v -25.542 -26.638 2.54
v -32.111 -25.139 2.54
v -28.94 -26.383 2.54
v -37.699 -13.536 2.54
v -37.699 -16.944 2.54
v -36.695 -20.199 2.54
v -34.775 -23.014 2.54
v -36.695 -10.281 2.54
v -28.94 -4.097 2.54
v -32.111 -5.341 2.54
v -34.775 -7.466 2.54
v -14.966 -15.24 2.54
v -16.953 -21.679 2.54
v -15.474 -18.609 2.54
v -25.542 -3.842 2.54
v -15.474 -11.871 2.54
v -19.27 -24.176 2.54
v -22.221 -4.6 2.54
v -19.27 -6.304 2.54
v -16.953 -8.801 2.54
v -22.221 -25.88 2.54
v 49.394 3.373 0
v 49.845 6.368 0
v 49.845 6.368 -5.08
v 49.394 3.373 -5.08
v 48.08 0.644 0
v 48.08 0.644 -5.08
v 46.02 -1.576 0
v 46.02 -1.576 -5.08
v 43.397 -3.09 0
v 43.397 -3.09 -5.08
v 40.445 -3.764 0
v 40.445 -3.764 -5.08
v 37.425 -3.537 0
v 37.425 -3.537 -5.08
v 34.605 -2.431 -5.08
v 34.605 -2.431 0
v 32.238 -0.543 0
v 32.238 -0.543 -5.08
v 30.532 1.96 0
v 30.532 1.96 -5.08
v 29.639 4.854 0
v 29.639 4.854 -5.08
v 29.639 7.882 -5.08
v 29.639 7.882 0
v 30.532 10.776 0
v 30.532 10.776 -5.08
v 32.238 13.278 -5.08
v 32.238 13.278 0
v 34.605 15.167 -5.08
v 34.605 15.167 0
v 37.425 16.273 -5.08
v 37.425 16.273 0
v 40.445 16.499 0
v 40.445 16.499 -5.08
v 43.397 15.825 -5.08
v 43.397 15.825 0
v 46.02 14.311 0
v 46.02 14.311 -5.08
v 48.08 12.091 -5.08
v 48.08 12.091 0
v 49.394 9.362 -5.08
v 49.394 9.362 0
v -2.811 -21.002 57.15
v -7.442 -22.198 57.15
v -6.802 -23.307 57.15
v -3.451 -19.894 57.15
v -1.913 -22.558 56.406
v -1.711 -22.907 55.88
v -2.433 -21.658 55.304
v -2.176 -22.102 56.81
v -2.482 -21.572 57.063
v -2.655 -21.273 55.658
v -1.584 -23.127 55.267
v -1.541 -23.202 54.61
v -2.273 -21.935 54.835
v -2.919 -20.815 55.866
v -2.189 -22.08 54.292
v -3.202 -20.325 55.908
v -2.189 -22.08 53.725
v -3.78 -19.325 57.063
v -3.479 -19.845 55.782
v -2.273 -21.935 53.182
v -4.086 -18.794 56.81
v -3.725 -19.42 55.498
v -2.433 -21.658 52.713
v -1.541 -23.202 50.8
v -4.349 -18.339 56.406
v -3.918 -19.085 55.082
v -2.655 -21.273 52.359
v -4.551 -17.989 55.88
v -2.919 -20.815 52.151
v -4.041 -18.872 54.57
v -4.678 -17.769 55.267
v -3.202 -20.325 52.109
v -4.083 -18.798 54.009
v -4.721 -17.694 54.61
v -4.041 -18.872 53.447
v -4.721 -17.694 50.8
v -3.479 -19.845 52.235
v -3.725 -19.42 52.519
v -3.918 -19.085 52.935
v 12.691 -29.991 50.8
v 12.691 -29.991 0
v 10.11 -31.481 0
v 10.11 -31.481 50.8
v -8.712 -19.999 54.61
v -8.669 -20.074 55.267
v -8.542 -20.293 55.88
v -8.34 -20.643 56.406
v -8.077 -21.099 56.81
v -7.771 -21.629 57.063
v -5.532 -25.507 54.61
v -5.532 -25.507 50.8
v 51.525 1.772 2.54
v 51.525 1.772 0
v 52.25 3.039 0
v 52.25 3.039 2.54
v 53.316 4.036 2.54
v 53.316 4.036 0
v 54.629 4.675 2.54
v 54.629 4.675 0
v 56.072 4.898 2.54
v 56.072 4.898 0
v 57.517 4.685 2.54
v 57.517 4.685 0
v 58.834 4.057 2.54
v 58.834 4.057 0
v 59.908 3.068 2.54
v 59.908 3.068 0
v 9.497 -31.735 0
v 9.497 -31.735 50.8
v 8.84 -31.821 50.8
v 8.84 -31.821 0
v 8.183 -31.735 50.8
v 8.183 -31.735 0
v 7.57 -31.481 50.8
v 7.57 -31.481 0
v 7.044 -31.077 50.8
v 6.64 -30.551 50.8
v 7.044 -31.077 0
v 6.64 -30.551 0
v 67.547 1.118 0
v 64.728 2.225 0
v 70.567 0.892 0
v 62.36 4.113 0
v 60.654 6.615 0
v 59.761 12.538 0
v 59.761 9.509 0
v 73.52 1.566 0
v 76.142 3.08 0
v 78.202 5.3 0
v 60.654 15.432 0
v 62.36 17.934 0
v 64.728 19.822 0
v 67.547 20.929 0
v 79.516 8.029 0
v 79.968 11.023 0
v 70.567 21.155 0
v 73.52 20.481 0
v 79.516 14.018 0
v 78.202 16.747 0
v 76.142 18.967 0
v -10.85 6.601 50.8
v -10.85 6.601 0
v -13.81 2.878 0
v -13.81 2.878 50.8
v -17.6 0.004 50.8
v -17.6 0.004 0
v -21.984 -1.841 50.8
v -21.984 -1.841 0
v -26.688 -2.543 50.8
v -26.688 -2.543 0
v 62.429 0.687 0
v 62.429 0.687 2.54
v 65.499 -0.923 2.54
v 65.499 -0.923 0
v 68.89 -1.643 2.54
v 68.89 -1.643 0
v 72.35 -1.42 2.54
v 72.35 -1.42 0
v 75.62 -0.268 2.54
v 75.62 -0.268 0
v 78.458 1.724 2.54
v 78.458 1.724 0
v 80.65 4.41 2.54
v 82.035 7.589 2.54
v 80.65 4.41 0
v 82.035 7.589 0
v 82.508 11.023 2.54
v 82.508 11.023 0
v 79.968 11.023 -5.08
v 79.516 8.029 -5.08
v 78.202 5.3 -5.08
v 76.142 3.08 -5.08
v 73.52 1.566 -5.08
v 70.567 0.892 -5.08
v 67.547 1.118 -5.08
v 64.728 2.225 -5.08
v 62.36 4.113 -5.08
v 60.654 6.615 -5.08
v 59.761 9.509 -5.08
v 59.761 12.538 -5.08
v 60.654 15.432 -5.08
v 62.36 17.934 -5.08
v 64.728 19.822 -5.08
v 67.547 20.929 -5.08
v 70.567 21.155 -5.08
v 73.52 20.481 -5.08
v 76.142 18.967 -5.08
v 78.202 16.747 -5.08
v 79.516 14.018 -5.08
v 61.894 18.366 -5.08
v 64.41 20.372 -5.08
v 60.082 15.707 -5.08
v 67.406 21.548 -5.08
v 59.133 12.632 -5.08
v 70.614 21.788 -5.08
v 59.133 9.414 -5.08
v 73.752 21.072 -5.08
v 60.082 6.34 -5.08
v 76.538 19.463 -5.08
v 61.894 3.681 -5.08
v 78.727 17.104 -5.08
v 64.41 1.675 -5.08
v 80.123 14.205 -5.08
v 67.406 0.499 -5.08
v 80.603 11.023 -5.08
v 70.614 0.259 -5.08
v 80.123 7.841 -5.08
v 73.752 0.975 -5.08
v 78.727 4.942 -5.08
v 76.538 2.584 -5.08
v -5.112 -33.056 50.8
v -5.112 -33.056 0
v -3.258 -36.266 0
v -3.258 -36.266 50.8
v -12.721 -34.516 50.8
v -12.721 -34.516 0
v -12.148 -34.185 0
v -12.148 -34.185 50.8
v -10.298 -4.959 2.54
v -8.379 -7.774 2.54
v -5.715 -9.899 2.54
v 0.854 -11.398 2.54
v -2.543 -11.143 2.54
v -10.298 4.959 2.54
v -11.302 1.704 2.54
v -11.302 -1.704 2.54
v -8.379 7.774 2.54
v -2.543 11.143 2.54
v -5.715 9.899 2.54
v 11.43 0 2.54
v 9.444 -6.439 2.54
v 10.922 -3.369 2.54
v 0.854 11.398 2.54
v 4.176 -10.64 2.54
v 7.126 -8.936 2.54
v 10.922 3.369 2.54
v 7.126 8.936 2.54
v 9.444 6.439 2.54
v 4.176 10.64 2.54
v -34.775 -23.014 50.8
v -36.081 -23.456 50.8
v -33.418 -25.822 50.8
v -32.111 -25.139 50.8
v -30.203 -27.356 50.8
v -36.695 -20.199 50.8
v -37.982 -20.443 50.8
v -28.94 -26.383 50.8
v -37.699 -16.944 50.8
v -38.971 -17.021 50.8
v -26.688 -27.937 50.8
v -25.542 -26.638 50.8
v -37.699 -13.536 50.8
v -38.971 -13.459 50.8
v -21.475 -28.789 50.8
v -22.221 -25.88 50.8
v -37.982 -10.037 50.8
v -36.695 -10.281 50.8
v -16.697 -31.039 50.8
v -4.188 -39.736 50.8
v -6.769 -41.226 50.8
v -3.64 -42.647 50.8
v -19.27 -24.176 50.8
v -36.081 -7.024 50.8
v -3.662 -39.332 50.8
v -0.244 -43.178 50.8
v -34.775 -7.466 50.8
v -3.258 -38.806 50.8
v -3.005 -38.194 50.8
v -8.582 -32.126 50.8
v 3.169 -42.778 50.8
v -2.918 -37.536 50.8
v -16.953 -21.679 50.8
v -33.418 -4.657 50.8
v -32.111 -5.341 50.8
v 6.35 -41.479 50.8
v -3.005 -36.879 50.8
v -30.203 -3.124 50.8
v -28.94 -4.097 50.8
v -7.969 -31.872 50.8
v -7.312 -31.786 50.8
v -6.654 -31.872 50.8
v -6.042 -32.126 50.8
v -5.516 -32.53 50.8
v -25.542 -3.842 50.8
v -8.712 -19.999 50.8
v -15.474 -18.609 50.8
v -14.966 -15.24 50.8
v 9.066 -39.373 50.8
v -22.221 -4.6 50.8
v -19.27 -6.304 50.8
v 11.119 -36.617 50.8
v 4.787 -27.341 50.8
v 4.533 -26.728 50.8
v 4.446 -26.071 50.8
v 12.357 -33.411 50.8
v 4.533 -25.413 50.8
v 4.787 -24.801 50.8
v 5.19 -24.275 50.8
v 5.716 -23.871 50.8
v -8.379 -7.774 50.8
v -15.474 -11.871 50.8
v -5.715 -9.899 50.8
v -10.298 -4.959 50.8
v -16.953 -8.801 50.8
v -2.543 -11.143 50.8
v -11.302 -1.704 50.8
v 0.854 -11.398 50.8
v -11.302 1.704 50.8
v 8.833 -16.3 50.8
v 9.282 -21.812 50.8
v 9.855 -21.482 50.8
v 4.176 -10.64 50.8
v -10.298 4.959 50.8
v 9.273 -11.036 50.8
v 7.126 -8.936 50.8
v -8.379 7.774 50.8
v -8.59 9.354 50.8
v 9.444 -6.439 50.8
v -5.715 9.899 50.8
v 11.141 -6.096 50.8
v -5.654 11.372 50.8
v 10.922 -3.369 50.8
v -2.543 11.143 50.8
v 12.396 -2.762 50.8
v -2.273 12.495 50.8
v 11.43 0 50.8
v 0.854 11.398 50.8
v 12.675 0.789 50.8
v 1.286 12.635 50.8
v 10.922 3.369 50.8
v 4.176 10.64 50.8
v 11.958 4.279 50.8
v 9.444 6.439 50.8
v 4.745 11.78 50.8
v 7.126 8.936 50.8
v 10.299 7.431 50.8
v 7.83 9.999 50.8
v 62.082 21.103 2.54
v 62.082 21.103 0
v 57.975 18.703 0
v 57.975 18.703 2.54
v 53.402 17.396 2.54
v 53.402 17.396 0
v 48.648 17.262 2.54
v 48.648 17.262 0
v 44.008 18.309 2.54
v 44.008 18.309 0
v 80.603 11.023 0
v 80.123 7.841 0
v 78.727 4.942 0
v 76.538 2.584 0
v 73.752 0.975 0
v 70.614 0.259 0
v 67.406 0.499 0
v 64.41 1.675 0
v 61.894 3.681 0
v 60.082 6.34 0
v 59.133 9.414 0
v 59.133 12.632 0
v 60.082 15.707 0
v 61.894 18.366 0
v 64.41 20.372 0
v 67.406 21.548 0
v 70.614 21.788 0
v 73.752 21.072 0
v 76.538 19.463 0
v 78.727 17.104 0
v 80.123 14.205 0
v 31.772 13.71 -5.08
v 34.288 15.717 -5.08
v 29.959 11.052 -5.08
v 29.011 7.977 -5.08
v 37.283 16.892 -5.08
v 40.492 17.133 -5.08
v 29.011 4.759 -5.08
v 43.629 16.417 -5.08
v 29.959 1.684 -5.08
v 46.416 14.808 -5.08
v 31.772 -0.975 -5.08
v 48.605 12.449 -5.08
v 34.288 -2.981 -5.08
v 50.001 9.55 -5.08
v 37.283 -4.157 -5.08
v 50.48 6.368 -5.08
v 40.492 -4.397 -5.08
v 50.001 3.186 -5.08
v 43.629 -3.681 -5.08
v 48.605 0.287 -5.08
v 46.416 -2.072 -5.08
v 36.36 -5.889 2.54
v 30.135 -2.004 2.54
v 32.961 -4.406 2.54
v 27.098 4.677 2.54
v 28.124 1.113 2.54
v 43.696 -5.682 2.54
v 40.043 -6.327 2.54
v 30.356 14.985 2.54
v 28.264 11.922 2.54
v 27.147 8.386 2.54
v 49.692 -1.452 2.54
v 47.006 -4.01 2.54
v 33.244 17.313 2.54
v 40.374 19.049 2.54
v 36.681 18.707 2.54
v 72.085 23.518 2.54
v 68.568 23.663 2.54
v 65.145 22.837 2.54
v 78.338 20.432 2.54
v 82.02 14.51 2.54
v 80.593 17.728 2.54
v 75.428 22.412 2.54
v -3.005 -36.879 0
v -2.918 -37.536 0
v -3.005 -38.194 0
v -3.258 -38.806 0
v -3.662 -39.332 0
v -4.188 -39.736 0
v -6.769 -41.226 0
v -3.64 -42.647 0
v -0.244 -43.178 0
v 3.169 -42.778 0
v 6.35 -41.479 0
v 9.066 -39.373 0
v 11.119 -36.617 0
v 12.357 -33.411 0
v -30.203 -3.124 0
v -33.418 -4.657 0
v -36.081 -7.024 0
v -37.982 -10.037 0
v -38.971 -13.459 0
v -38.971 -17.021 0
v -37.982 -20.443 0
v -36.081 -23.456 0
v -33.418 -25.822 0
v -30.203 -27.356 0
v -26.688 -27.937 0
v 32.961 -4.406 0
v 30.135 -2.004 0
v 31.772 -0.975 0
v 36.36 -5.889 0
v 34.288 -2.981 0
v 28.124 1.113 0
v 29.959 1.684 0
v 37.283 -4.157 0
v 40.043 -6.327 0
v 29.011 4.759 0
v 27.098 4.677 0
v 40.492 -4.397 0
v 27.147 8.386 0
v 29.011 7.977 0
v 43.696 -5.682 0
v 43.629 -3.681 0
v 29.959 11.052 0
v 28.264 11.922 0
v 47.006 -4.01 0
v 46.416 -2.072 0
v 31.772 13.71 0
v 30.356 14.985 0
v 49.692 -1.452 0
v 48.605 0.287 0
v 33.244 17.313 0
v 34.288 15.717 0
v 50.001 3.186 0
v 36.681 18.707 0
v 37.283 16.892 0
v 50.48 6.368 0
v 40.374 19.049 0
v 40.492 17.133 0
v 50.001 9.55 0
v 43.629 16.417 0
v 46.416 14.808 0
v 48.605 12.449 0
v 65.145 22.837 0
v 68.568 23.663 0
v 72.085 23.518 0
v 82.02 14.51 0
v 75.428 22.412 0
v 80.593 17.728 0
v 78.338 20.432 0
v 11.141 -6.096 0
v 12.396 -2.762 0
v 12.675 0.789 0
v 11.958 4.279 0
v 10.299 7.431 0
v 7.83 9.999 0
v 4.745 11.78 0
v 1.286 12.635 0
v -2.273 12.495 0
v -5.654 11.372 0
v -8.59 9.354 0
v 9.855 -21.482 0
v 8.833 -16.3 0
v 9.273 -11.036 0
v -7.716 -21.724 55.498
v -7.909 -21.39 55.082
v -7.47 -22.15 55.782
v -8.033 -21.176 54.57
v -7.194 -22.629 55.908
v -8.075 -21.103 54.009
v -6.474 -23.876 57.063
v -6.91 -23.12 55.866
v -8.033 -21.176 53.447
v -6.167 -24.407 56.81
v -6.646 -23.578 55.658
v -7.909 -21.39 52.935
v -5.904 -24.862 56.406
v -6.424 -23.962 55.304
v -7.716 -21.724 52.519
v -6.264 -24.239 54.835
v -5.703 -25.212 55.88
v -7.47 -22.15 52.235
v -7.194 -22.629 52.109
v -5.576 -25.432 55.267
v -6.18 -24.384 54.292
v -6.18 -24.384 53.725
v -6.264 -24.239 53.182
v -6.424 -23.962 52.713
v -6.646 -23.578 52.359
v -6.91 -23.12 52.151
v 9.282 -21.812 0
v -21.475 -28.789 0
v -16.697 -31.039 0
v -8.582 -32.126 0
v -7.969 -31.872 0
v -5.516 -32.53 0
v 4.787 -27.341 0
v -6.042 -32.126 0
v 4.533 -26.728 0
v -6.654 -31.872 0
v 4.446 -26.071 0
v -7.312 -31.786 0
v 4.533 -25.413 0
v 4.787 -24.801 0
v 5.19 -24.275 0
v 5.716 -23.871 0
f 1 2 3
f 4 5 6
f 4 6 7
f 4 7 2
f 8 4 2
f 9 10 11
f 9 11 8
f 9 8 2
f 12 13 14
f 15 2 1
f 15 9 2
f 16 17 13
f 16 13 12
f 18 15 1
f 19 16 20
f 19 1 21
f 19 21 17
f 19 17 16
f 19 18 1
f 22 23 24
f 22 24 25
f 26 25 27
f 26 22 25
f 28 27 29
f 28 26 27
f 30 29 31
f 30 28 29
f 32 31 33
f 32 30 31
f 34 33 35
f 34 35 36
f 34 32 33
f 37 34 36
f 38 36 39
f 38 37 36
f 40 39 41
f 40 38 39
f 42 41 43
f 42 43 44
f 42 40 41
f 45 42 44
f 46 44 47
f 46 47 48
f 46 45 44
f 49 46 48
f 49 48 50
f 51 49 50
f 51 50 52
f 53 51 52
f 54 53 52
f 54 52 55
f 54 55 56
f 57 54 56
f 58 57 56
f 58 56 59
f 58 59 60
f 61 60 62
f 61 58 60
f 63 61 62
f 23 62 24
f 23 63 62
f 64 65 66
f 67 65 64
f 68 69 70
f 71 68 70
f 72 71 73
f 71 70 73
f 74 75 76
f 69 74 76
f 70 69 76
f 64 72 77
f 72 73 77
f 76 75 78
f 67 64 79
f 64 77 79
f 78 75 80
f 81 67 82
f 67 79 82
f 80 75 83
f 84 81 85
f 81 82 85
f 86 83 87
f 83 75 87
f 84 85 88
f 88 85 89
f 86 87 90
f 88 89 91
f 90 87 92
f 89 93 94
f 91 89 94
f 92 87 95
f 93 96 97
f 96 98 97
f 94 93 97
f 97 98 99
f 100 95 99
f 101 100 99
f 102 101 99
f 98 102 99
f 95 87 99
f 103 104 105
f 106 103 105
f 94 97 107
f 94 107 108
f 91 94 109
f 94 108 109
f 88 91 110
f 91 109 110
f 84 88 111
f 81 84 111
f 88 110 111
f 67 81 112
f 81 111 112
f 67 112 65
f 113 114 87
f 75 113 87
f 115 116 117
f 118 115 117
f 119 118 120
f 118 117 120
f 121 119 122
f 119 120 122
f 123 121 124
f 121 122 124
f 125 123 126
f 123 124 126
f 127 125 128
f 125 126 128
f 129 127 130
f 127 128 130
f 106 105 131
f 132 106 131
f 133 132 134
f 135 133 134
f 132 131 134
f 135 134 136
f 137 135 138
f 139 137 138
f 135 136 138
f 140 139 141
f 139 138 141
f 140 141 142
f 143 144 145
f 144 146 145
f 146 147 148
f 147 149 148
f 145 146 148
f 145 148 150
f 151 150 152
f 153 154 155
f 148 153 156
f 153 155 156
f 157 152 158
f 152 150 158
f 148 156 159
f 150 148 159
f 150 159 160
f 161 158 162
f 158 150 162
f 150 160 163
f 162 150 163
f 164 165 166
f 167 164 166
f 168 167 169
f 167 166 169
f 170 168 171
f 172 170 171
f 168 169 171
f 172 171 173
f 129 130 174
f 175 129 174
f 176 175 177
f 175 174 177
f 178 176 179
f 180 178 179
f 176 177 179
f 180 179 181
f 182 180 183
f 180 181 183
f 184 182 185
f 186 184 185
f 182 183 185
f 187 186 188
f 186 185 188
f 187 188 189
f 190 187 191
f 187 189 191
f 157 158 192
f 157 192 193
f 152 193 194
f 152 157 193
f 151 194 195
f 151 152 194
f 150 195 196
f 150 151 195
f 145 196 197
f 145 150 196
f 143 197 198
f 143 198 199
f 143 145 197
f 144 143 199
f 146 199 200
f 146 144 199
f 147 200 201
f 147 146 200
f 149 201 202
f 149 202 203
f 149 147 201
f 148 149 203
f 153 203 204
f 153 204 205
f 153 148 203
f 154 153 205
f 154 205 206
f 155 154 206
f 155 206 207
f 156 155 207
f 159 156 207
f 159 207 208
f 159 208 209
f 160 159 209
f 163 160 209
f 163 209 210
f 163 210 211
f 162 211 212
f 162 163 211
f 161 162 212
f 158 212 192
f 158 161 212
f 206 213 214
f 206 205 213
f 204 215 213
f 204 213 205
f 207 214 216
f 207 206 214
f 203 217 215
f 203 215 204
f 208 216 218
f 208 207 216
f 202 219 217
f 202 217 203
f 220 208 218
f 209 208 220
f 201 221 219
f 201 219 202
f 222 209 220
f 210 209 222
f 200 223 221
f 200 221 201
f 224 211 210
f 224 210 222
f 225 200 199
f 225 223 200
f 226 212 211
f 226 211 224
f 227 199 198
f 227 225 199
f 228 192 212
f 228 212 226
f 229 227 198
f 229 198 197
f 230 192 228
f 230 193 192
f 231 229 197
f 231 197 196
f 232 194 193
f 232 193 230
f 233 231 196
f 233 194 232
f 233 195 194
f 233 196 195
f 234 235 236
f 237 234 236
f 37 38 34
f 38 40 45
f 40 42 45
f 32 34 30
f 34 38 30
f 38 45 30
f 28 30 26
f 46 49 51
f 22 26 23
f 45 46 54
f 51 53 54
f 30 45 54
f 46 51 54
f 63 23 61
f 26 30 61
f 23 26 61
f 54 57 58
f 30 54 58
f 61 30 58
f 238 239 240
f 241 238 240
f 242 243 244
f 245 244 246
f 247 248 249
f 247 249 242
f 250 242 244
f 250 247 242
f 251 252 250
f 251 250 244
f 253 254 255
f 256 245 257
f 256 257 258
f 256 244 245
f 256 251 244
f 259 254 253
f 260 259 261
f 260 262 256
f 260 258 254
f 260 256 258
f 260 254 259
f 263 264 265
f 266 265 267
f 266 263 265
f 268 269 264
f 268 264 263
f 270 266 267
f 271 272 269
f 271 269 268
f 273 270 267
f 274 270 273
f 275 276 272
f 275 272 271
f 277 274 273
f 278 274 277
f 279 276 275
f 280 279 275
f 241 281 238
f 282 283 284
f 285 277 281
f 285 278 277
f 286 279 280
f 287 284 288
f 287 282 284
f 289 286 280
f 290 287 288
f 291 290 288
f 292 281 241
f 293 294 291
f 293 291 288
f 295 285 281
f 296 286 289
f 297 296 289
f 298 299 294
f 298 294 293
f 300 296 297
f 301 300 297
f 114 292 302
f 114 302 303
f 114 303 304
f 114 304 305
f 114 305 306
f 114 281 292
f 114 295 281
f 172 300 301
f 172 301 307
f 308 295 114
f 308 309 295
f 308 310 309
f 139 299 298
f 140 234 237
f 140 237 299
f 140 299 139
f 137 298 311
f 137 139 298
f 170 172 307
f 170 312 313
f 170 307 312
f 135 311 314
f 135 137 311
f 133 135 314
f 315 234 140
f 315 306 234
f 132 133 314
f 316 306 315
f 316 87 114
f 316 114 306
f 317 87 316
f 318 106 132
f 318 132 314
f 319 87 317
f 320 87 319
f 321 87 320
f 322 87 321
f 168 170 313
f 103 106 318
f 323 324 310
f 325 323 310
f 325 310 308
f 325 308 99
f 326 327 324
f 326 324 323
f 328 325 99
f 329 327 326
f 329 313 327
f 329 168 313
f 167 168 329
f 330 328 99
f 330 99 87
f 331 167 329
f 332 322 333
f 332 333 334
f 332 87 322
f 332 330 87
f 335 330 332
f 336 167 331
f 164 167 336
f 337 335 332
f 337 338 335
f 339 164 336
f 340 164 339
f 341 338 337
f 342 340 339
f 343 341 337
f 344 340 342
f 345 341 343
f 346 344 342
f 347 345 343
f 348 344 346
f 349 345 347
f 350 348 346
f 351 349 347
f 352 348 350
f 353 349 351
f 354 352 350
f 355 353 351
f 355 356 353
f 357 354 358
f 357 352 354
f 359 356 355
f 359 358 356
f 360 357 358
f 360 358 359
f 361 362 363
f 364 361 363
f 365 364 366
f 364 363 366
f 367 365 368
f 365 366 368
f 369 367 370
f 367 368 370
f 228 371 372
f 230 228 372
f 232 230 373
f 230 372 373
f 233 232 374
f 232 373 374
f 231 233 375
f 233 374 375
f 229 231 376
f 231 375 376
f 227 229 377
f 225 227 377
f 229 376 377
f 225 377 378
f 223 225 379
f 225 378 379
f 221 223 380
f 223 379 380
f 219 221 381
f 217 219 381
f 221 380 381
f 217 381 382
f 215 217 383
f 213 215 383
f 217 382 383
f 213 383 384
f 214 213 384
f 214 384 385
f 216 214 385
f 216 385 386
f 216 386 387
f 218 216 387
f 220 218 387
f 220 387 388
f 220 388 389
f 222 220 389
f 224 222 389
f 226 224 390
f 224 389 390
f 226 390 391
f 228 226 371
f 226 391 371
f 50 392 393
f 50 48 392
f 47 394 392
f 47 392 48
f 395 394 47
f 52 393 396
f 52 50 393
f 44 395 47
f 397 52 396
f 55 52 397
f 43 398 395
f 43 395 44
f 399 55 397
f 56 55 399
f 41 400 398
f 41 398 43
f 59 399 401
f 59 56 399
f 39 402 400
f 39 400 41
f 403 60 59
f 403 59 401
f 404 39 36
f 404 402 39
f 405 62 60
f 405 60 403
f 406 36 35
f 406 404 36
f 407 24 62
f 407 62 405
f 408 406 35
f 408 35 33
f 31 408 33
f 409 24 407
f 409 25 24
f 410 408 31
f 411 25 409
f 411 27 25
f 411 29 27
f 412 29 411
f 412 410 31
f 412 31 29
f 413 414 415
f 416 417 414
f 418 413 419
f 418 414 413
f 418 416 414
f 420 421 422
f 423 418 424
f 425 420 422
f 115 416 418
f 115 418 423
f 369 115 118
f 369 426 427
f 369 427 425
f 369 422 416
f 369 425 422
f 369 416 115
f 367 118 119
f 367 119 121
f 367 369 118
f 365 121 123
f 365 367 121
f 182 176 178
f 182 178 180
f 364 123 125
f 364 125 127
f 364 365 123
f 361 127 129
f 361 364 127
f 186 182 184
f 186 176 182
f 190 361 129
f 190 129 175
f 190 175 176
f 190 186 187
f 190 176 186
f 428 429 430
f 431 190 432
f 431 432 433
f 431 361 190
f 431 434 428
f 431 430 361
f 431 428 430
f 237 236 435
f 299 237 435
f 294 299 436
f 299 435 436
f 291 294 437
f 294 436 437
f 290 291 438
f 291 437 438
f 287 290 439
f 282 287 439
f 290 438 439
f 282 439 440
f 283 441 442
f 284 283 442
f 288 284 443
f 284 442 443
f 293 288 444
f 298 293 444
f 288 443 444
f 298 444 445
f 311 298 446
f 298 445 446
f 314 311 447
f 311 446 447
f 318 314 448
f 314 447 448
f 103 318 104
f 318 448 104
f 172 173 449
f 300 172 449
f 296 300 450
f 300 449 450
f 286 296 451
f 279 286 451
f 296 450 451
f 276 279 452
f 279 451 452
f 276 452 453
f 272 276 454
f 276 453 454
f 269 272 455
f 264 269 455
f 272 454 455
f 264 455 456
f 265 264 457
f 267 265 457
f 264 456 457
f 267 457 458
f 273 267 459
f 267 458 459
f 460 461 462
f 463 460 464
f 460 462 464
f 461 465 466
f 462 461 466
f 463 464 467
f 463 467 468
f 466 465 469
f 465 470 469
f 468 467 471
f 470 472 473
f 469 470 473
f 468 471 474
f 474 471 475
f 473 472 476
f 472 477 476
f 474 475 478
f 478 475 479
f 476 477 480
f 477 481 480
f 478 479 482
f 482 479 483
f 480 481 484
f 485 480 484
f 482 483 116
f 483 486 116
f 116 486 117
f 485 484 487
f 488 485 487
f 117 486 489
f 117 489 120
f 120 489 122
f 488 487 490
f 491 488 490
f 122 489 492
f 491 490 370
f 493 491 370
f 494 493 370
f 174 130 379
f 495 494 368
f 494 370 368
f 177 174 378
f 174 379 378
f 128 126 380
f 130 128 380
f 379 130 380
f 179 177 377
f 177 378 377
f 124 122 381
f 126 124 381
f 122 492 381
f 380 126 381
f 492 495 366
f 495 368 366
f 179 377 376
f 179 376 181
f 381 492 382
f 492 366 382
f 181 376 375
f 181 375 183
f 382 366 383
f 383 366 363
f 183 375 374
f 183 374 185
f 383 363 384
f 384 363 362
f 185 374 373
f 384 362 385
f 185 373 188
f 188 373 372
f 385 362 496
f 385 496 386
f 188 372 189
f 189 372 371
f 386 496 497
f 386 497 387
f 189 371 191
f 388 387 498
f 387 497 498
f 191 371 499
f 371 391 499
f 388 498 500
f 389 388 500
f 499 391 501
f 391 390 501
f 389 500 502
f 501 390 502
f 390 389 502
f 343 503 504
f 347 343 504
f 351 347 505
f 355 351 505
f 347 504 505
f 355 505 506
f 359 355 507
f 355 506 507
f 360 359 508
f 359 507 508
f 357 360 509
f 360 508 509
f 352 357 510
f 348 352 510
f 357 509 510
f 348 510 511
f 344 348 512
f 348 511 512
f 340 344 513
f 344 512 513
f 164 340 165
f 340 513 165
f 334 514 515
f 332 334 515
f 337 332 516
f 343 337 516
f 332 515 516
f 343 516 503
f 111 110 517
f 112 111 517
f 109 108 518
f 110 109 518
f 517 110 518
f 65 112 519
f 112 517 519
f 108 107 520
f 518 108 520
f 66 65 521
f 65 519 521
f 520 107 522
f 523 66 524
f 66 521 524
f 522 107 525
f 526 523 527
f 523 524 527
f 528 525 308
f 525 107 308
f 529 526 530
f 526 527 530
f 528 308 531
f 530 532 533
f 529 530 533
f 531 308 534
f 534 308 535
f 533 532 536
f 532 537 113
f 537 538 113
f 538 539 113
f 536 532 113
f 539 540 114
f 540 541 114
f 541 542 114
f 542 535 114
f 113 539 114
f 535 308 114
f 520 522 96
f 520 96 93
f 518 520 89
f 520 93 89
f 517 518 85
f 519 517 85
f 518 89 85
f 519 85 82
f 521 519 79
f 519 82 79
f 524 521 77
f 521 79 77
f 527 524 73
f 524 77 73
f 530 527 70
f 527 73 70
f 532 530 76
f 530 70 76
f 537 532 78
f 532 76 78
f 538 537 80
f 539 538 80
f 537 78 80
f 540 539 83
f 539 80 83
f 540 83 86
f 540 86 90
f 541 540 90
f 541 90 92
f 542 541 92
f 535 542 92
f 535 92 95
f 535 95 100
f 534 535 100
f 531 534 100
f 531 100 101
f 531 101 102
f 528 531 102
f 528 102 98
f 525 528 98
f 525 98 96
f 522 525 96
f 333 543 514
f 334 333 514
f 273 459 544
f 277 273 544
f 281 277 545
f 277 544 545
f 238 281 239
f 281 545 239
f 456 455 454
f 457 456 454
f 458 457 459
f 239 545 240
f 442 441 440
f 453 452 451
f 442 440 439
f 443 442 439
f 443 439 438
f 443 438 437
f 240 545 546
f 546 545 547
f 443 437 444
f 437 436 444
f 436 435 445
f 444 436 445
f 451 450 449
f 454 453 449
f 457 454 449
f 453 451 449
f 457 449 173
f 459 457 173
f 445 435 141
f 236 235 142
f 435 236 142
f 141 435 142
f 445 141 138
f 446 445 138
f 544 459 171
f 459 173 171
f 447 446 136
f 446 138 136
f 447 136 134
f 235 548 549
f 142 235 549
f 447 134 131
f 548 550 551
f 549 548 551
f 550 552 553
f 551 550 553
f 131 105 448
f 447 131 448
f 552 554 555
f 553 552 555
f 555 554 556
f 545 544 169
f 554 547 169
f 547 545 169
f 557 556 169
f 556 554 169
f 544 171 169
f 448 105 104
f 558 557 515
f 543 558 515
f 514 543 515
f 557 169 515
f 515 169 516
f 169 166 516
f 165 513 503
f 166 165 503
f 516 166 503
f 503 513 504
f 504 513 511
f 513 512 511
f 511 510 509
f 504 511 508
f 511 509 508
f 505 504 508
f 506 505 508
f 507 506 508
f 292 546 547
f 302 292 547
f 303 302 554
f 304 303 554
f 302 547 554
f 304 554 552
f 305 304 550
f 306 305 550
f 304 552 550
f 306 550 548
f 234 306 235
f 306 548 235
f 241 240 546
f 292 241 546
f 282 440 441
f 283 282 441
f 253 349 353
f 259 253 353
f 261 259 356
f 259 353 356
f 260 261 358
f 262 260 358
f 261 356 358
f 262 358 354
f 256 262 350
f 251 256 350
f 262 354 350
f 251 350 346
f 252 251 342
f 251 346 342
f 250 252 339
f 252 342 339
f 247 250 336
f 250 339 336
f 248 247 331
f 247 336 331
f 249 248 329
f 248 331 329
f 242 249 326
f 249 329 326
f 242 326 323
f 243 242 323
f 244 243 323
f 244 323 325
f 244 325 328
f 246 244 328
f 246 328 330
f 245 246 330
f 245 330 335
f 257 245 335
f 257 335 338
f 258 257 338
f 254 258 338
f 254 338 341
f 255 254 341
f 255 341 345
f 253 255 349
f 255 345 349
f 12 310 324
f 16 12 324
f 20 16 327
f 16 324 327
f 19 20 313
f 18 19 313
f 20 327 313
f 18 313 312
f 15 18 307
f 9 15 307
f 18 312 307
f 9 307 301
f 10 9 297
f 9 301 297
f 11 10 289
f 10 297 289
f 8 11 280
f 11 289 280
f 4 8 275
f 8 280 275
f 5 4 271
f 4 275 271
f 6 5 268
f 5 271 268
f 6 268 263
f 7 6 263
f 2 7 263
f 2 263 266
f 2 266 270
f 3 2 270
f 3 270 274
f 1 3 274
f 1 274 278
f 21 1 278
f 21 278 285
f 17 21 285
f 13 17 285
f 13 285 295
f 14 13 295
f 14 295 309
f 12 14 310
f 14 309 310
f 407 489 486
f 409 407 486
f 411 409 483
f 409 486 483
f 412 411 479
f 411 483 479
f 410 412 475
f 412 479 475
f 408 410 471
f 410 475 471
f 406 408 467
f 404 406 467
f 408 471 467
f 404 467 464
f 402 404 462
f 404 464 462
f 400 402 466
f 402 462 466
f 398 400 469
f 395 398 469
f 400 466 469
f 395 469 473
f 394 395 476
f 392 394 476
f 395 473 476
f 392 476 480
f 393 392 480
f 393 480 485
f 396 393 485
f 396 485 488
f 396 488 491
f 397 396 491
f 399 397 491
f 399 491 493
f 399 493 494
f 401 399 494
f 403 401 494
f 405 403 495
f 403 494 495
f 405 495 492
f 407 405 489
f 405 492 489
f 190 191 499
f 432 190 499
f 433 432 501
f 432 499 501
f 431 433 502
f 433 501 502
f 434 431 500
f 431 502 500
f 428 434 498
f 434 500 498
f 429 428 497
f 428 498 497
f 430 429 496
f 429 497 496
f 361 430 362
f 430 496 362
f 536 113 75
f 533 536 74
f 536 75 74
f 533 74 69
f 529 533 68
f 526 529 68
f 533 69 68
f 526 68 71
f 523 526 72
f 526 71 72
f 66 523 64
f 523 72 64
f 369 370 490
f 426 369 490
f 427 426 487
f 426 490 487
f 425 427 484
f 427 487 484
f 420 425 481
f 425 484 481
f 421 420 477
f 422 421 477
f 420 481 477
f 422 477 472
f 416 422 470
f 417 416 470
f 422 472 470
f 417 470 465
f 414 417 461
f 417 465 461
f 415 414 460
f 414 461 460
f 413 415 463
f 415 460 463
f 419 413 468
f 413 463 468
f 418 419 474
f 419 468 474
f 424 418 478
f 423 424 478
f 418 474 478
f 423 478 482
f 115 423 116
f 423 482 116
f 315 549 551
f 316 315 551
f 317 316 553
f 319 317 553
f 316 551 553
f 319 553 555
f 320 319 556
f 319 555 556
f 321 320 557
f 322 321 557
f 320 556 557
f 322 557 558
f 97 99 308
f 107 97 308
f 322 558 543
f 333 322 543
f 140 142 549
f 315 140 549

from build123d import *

# Parameters (mm, degrees)
F0_R     = 11.43
F1_DEPTH = 50.8
F2_R     = 11.43
F3_DEPTH = 48.26
F5_DEPTH = 6.35
F6_R     = 11.303
F7_DEPTH = 2.54
F8_R     = 10.795
F8_R_2   = 10.16
F9_DEPTH = 5.08
F10_R    = 2.54
F12_D    = 3.81


# Not quite as in the source:
# - a feature names something its author has since deleted; it is built from what else it names


with BuildPart() as f1:
    # F0 (on Top) → F1 (new body)
    with BuildSketch(Plane.XY):
        with BuildLine():
            ThreePointArc((-26.6880410914, -27.9366493299), (-17.5198893886, -24.3227590811), (-13.696455988, -15.239997089))
            ThreePointArc((-13.696455988, -15.239997089), (-17.5198098165, -6.1573128632), (-26.687818625, -2.5433397409))
            ThreePointArc((-26.687818625, -2.5433397409), (-39.0964559875, -15.2398858265), (-26.6880410914, -27.9366493299))
        make_face()
        with Locations((-26.396455988, -15.239997089)):
            Circle(F0_R, mode=Mode.SUBTRACT)
        with BuildLine():
            ThreePointArc((-6.3500025059, -19.4814729967), (-11.2476380181, -19.4814737375), (-13.696455988, -15.239997089))
            ThreePointArc((-13.696455988, -15.239997089), (-17.5198893886, -24.3227590811), (-26.6880410914, -27.9366493299))
            ThreePointArc((-26.6880410914, -27.9366493299), (-19.0079324117, -29.7476810857), (-12.7205570443, -34.5155754156))
            Line((-12.7205570443, -34.5155754156), (-12.1476135977, -34.1847861939))
            ThreePointArc((-12.1476135977, -34.1847861939), (-11.8147071535, -25.8213790536), (-6.3500025059, -19.4814729967))
        make_face()
        with BuildLine():
            ThreePointArc((-26.687818625, -2.5433397409), (-17.5198098165, -6.1573128632), (-13.696455988, -15.239997089))
            ThreePointArc((-13.696455988, -15.239997089), (-11.2476381845, -10.9985205365), (-6.3500028388, -10.9985209891))
            ThreePointArc((-6.3500028388, -10.9985209891), (-12.3041591128, -3.1460560273), (-10.8499450322, 6.6006585125))
            ThreePointArc((-10.8499450322, 6.6006585125), (-17.5998643999, 0.0038612886), (-26.687818625, -2.5433397409))
        make_face()
        with BuildLine():
            ThreePointArc((-6.3500028388, -10.9985209891), (-11.2476381845, -10.9985205365), (-13.696455988, -15.239997089))
            ThreePointArc((-13.696455988, -15.239997089), (-11.2476380181, -19.4814737375), (-6.3500025059, -19.4814729967))
            ThreePointArc((-6.3500025059, -19.4814729967), (-4.557344255, -17.6888142035), (-3.9011858191, -15.239997089))
            ThreePointArc((-3.9011858191, -15.239997089), (-4.5573443511, -12.791179808), (-6.3500028388, -10.9985209891))
        make_face()
        with BuildLine():
            ThreePointArc((-10.8499450322, 6.6006585125), (-12.3041591128, -3.1460560273), (-6.3500028388, -10.9985209891))
            ThreePointArc((-6.3500028388, -10.9985209891), (3.4275119235, -12.2287432721), (11.1413104344, -6.0959988356))
            ThreePointArc((11.1413104344, -6.0959988356), (12.3041586977, -3.1460576507), (12.7, 0))
            ThreePointArc((12.7, 0), (3.4275135369, 12.2287428199), (-10.8499450322, 6.6006585125))
        make_face()
        Circle(F0_R, mode=Mode.SUBTRACT)
        with BuildLine():
            ThreePointArc((11.1413104344, -6.0959988356), (3.4275119235, -12.2287432721), (-6.3500028388, -10.9985209891))
            ThreePointArc((-6.3500028388, -10.9985209891), (-4.5573443511, -12.791179808), (-3.9011858191, -15.239997089))
            ThreePointArc((-3.9011858191, -15.239997089), (-4.557344255, -17.6888142035), (-6.3500025059, -19.4814729967))
            ThreePointArc((-6.3500025059, -19.4814729967), (1.8728689002, -17.9188492428), (9.2822469769, -21.8122441204))
            Line((9.2822469769, -21.8122441204), (9.8548289521, -21.4816635945))
            ThreePointArc((9.8548289521, -21.4816635945), (8.8695235868, -13.6526593666), (11.1413104344, -6.0959988356))
        make_face()
        with BuildLine():
            ThreePointArc((9.2822469769, -21.8122441204), (1.8728689002, -17.9188492428), (-6.3500025059, -19.4814729967))
            ThreePointArc((-6.3500025059, -19.4814729967), (-11.8147071535, -25.8213790536), (-12.1476135977, -34.1847861939))
            Line((-12.1476135977, -34.1847861939), (-8.5817221083, -32.126016734))
            ThreePointArc((-8.5817221083, -32.126016734), (-6.6543217897, -31.8722692357), (-5.1120173776, -33.0557204943))
            Line((-5.1120173776, -33.0557204943), (-3.2583915378, -36.2662929918))
            ThreePointArc((-3.2583915378, -36.2662929918), (-3.0046440395, -38.1936933104), (-4.1880952981, -39.7359977225))
            Line((-4.1880952981, -39.7359977225), (-6.7686986704, -41.225910533))
            ThreePointArc((-6.7686986704, -41.225910533), (6.3500024258, -41.4785154055), (12.6905856699, -29.9910817583))
            Line((12.6905856699, -29.9910817583), (10.1099822977, -31.4809945689))
            ThreePointArc((10.1099822977, -31.4809945689), (8.1825819791, -31.7347420671), (6.640277567, -30.5512908085))
            Line((6.640277567, -30.5512908085), (4.7866517271, -27.340718311))
            ThreePointArc((4.7866517271, -27.340718311), (4.5329042289, -25.4133179924), (5.7163554875, -23.8710135804))
            Line((5.7163554875, -23.8710135804), (9.2822469769, -21.8122441204))
        make_face()
        Circle(F0_R)
        with Locations((-26.396455988, -15.239997089)):
            Circle(F0_R)
    extrude(amount=F1_DEPTH)

    # F2 (on face) → F3 (cut)
    with BuildSketch(Plane.XY.offset(50.8)):
        Circle(F2_R)
        with Locations((-26.396455988, -15.239997089)):
            Circle(F2_R)
    extrude(amount=-F3_DEPTH, mode=Mode.SUBTRACT)

    # F4 (on face) → F5 (join)
    with BuildSketch(Plane.XY.offset(50.8)):
        Polygon((-4.7208319521, -17.694307821), (-8.7123144021, -19.9987924618), (-5.5323556007, -25.5066398663), (-1.5408731507, -23.2021552255), align=None)
    extrude(amount=F5_DEPTH)

    # F10
    f10_edges = [f1.edges().sort_by_distance(p)[0] for p in [
        (-3.536614, -24.354398, 57.15),
        (-6.716573, -18.84655, 57.15),
    ]]
    fillet(f10_edges, radius=F10_R)

    # F12 (through all)
    with Locations(Plane(origin=(-15.1939675014, -8.7722456953, 0), x_dir=(0.500000191, -0.8660252935, 0), z_dir=(-0.8660252935, -0.500000191, 0))):
        with Locations((16.1432588328, 54.0085211396)):
            Hole(F12_D / 2)


with BuildPart() as f7:
    # F6 (on Top) → F7 (new body)
    with BuildSketch(Plane.XY):
        with BuildLine():
            ThreePointArc((44.0081312178, 18.3094680903), (50.0822556943, 13.6613132529), (52.3854183536, 6.367769991))
            ThreePointArc((52.3854183536, 6.367769991), (52.1684100917, 4.0300537406), (51.5248014611, 1.772227843))
            ThreePointArc((51.5248014611, 1.772227843), (55.3424694696, 4.8401671142), (59.9082168201, 3.0679392713))
            ThreePointArc((59.9082168201, 3.0679392713), (57.1989858639, 12.5428148688), (62.0815389765, 21.1028309357))
            ThreePointArc((62.0815389765, 21.1028309357), (53.401953478, 17.3955488238), (44.0081312178, 18.3094680903))
        make_face()
        with BuildLine():
            ThreePointArc((51.5248014611, 1.772227843), (52.1684100917, 4.0300537406), (52.3854183536, 6.367769991))
            ThreePointArc((52.3854183536, 6.367769991), (50.0822556943, 13.6613132529), (44.0081312178, 18.3094680903))
            ThreePointArc((44.0081312178, 18.3094680903), (28.1236963669, 1.1126215915), (51.5248014611, 1.772227843))
        make_face()
        with Locations((39.6854183536, 6.367769991)):
            Circle(F6_R, mode=Mode.SUBTRACT)
        with Locations((39.6854183536, 6.367769991)):
            Circle(F6_R)
        with BuildLine():
            ThreePointArc((82.5077646182, 11.0233747334), (75.4276816261, 22.4122523263), (62.0815389765, 21.1028309357))
            ThreePointArc((62.0815389765, 21.1028309357), (57.1989858639, 12.5428148688), (59.9082168201, 3.0679392713))
            ThreePointArc((59.9082168201, 3.0679392713), (74.0247388275, -0.9560713522), (82.5077646182, 11.0233747334))
        make_face()
        with Locations((69.8077646182, 11.0233747334)):
            Circle(F6_R, mode=Mode.SUBTRACT)
        with Locations((69.8077646182, 11.0233747334)):
            Circle(F6_R)
    extrude(amount=F7_DEPTH)

    # F8 (on face) → F9 (join)
    with BuildSketch(Plane(origin=(0, 0, 0), x_dir=(1, 0, 0), z_dir=(0, 0, -1))):
        with Locations((39.6854183536, -6.367769991)):
            Circle(F8_R)
        with Locations((39.6854183536, -6.367769991)):
            Circle(F8_R_2, mode=Mode.SUBTRACT)
        with Locations((69.8077646182, -11.0233747334)):
            Circle(F8_R)
        with Locations((69.8077646182, -11.0233747334)):
            Circle(F8_R_2, mode=Mode.SUBTRACT)
    extrude(amount=F9_DEPTH)


solid = Compound([f1.part, f7.part])
